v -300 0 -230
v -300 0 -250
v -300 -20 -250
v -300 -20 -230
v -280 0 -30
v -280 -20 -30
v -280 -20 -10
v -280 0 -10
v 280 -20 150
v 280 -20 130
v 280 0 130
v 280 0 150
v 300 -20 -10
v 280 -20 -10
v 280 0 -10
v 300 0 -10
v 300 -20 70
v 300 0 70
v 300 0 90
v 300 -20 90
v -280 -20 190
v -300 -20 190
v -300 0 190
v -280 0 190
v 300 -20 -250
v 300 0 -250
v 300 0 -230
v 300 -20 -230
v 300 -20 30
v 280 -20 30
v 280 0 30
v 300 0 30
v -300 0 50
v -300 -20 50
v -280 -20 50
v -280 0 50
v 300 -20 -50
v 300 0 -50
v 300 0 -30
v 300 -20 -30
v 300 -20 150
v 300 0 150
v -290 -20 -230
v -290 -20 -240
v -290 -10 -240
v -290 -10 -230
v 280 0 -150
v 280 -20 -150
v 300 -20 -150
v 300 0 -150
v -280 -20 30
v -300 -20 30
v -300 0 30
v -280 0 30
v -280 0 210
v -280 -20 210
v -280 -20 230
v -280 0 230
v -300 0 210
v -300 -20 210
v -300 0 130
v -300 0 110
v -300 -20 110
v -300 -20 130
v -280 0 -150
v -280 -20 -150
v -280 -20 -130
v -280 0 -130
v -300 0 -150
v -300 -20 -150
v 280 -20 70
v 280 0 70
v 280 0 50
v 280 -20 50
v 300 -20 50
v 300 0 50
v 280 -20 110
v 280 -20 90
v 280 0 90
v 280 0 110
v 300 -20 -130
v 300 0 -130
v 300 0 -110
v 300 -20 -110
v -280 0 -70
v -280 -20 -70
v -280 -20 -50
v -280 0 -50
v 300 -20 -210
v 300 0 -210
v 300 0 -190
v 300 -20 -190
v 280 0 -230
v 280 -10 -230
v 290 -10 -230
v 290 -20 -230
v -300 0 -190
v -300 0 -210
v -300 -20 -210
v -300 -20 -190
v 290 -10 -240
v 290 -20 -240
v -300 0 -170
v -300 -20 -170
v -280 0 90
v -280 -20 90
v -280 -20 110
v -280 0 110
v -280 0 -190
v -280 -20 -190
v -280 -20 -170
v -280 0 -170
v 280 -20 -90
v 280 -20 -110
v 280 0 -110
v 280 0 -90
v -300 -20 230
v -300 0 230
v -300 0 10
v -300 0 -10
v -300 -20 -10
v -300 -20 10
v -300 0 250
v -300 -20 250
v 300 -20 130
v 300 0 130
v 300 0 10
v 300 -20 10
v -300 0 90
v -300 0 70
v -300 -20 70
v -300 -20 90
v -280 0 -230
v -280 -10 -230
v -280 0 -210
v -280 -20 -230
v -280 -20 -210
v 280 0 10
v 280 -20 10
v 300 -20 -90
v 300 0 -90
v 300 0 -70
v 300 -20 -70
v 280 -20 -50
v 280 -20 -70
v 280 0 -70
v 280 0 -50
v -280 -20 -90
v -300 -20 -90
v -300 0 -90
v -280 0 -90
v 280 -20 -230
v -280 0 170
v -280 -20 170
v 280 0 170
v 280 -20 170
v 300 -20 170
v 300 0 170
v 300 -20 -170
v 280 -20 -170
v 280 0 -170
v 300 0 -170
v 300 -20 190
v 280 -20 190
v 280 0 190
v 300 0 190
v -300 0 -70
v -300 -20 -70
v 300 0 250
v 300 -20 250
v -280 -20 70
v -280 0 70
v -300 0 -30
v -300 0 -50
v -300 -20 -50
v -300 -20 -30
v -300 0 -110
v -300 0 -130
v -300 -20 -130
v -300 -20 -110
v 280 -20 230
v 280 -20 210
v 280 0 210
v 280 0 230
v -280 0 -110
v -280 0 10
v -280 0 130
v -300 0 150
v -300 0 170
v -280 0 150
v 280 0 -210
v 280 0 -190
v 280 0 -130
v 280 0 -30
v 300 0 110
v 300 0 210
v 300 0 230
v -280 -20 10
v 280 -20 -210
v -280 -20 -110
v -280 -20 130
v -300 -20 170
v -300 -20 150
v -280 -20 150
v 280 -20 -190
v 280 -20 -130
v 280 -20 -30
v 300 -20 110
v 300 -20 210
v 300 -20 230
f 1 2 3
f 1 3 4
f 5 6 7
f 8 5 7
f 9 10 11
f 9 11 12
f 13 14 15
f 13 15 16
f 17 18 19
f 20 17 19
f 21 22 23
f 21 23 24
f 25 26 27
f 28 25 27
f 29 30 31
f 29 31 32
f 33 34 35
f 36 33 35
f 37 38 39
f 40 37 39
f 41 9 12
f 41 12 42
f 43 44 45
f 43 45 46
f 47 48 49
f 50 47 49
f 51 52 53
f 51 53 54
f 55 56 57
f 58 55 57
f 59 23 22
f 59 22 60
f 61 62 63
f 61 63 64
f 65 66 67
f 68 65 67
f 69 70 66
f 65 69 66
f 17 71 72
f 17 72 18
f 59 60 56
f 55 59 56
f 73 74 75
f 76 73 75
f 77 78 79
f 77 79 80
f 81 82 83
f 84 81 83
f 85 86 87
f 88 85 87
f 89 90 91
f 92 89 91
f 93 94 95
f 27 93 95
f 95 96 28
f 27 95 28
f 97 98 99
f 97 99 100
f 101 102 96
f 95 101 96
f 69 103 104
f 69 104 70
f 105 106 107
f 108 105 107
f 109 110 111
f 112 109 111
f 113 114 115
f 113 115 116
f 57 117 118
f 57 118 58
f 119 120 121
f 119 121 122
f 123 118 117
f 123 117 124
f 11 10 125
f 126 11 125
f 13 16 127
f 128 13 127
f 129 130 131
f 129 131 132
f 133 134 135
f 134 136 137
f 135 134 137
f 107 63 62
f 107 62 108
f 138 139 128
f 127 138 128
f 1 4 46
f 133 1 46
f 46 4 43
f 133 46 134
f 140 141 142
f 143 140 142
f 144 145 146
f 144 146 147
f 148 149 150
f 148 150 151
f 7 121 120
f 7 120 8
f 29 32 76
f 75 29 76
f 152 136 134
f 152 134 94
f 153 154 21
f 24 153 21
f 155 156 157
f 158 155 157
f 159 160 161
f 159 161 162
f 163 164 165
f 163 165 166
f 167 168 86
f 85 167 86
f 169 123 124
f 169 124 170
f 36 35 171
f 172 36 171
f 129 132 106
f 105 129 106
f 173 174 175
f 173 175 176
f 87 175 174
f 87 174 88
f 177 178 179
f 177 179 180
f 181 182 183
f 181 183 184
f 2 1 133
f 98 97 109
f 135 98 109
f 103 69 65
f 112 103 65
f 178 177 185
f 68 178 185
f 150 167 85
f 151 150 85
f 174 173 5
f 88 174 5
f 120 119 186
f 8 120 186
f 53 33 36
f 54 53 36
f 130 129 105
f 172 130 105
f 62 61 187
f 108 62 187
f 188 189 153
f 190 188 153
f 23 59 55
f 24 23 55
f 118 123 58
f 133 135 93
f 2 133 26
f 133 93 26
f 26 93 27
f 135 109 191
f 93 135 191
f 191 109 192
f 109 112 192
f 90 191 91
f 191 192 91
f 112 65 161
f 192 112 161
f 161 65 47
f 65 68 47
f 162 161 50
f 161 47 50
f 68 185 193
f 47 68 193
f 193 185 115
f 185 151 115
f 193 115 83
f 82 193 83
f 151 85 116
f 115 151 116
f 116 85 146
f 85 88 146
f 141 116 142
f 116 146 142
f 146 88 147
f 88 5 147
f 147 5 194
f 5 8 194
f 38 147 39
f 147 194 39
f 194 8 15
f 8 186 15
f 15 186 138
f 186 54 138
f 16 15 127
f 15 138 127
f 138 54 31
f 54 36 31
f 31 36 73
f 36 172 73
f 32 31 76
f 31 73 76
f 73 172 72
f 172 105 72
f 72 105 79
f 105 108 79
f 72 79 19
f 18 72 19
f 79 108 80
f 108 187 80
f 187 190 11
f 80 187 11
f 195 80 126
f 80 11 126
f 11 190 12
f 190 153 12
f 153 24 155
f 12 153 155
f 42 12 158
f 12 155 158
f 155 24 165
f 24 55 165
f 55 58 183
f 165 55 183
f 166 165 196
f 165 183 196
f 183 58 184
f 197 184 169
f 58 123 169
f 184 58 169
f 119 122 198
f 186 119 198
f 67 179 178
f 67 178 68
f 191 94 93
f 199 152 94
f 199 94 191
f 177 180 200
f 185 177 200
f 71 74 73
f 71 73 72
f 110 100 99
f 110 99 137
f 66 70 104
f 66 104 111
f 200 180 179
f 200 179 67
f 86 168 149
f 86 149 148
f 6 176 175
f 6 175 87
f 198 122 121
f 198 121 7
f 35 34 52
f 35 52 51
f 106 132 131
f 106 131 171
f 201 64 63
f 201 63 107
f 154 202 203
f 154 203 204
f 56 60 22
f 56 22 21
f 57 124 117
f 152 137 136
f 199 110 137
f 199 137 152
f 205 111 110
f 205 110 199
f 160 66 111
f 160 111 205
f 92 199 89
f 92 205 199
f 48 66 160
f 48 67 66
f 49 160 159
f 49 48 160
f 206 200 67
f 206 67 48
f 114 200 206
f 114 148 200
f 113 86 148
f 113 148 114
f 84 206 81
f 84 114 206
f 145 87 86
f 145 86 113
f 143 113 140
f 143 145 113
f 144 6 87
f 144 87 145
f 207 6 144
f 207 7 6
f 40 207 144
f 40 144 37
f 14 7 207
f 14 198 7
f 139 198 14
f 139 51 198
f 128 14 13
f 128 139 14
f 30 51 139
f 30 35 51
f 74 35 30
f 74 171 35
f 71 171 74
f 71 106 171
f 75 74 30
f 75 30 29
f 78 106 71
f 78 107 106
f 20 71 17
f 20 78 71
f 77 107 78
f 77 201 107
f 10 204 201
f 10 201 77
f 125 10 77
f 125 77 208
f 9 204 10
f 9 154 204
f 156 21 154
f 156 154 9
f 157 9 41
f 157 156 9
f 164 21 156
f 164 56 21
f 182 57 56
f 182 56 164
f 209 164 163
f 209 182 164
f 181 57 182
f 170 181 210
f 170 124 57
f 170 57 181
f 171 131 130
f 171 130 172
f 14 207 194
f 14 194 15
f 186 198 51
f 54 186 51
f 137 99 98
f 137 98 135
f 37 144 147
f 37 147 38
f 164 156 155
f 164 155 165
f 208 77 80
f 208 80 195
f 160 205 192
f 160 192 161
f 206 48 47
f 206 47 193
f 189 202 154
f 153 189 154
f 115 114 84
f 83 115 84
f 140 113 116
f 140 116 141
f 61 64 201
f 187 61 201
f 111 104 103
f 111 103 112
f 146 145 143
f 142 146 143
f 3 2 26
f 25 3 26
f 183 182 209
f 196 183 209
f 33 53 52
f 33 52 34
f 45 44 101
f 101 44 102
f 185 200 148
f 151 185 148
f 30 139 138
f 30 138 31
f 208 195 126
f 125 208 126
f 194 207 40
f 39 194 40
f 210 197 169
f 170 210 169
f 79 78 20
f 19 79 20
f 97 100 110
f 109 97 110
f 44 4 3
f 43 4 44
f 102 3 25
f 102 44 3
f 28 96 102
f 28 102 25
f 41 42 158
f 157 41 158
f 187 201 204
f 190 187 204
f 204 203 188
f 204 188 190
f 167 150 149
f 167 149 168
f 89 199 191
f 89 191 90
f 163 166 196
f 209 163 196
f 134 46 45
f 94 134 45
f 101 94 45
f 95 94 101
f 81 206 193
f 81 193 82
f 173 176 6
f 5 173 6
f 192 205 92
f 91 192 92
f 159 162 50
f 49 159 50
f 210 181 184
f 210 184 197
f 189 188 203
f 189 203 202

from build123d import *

# Parameters (mm, degrees)
F0_W     = 600
F0_H     = 500
F1_DEPTH = 20
F2_W     = 20
F2_H     = 20
F3_DEPTH = 20
F4_W     = 580
F4_H     = 10
F5_DEPTH = 10


with BuildPart() as f1:
    # F0 (on Front) → F1 (new body)
    with BuildSketch(Plane.XZ):
        Rectangle(F0_W, F0_H)
    extrude(amount=F1_DEPTH)

    # F2 (on face) → F3 (cut, through all)
    with BuildSketch(Plane.XZ.offset(20)):
        with Locations((290, -220)):
            Rectangle(F2_W, F2_H)
        with Locations((290, -180)):
            Rectangle(F2_W, F2_H)
        with Locations((290, -140)):
            Rectangle(F2_W, F2_H)
        with Locations((290, -100)):
            Rectangle(F2_W, F2_H)
        with Locations((290, -60)):
            Rectangle(F2_W, F2_H)
        with Locations((290, -20)):
            Rectangle(F2_W, F2_H)
        with Locations((290, 20)):
            Rectangle(F2_W, F2_H)
        with Locations((290, 60)):
            Rectangle(F2_W, F2_H)
        with Locations((290, 100)):
            Rectangle(F2_W, F2_H)
        with Locations((290, 140)):
            Rectangle(F2_W, F2_H)
        with Locations((290, 180)):
            Rectangle(F2_W, F2_H)
        with Locations((-290, -220)):
            Rectangle(F2_W, F2_H)
        with Locations((-290, -60)):
            Rectangle(F2_W, F2_H)
        with Locations((-290, 100)):
            Rectangle(F2_W, F2_H)
        with Locations((-290, 20)):
            Rectangle(F2_W, F2_H)
        with Locations((-290, 180)):
            Rectangle(F2_W, F2_H)
        with Locations((-290, -20)):
            Rectangle(F2_W, F2_H)
        with Locations((-290, 140)):
            Rectangle(F2_W, F2_H)
        with Locations((-290, 60)):
            Rectangle(F2_W, F2_H)
        with Locations((-290, -100)):
            Rectangle(F2_W, F2_H)
        with Locations((-290, -140)):
            Rectangle(F2_W, F2_H)
        with Locations((-290, -180)):
            Rectangle(F2_W, F2_H)
        with Locations((290, 220)):
            Rectangle(F2_W, F2_H)
        with Locations((-290, 220)):
            Rectangle(F2_W, F2_H)
    extrude(amount=-F3_DEPTH, mode=Mode.SUBTRACT)

    # F4 (on face) → F5 (cut)
    with BuildSketch(Plane.XZ.offset(20)):
        with Locations((0, -235)):
            Rectangle(F4_W, F4_H)
    extrude(amount=-F5_DEPTH, mode=Mode.SUBTRACT)


solid = f1.part
